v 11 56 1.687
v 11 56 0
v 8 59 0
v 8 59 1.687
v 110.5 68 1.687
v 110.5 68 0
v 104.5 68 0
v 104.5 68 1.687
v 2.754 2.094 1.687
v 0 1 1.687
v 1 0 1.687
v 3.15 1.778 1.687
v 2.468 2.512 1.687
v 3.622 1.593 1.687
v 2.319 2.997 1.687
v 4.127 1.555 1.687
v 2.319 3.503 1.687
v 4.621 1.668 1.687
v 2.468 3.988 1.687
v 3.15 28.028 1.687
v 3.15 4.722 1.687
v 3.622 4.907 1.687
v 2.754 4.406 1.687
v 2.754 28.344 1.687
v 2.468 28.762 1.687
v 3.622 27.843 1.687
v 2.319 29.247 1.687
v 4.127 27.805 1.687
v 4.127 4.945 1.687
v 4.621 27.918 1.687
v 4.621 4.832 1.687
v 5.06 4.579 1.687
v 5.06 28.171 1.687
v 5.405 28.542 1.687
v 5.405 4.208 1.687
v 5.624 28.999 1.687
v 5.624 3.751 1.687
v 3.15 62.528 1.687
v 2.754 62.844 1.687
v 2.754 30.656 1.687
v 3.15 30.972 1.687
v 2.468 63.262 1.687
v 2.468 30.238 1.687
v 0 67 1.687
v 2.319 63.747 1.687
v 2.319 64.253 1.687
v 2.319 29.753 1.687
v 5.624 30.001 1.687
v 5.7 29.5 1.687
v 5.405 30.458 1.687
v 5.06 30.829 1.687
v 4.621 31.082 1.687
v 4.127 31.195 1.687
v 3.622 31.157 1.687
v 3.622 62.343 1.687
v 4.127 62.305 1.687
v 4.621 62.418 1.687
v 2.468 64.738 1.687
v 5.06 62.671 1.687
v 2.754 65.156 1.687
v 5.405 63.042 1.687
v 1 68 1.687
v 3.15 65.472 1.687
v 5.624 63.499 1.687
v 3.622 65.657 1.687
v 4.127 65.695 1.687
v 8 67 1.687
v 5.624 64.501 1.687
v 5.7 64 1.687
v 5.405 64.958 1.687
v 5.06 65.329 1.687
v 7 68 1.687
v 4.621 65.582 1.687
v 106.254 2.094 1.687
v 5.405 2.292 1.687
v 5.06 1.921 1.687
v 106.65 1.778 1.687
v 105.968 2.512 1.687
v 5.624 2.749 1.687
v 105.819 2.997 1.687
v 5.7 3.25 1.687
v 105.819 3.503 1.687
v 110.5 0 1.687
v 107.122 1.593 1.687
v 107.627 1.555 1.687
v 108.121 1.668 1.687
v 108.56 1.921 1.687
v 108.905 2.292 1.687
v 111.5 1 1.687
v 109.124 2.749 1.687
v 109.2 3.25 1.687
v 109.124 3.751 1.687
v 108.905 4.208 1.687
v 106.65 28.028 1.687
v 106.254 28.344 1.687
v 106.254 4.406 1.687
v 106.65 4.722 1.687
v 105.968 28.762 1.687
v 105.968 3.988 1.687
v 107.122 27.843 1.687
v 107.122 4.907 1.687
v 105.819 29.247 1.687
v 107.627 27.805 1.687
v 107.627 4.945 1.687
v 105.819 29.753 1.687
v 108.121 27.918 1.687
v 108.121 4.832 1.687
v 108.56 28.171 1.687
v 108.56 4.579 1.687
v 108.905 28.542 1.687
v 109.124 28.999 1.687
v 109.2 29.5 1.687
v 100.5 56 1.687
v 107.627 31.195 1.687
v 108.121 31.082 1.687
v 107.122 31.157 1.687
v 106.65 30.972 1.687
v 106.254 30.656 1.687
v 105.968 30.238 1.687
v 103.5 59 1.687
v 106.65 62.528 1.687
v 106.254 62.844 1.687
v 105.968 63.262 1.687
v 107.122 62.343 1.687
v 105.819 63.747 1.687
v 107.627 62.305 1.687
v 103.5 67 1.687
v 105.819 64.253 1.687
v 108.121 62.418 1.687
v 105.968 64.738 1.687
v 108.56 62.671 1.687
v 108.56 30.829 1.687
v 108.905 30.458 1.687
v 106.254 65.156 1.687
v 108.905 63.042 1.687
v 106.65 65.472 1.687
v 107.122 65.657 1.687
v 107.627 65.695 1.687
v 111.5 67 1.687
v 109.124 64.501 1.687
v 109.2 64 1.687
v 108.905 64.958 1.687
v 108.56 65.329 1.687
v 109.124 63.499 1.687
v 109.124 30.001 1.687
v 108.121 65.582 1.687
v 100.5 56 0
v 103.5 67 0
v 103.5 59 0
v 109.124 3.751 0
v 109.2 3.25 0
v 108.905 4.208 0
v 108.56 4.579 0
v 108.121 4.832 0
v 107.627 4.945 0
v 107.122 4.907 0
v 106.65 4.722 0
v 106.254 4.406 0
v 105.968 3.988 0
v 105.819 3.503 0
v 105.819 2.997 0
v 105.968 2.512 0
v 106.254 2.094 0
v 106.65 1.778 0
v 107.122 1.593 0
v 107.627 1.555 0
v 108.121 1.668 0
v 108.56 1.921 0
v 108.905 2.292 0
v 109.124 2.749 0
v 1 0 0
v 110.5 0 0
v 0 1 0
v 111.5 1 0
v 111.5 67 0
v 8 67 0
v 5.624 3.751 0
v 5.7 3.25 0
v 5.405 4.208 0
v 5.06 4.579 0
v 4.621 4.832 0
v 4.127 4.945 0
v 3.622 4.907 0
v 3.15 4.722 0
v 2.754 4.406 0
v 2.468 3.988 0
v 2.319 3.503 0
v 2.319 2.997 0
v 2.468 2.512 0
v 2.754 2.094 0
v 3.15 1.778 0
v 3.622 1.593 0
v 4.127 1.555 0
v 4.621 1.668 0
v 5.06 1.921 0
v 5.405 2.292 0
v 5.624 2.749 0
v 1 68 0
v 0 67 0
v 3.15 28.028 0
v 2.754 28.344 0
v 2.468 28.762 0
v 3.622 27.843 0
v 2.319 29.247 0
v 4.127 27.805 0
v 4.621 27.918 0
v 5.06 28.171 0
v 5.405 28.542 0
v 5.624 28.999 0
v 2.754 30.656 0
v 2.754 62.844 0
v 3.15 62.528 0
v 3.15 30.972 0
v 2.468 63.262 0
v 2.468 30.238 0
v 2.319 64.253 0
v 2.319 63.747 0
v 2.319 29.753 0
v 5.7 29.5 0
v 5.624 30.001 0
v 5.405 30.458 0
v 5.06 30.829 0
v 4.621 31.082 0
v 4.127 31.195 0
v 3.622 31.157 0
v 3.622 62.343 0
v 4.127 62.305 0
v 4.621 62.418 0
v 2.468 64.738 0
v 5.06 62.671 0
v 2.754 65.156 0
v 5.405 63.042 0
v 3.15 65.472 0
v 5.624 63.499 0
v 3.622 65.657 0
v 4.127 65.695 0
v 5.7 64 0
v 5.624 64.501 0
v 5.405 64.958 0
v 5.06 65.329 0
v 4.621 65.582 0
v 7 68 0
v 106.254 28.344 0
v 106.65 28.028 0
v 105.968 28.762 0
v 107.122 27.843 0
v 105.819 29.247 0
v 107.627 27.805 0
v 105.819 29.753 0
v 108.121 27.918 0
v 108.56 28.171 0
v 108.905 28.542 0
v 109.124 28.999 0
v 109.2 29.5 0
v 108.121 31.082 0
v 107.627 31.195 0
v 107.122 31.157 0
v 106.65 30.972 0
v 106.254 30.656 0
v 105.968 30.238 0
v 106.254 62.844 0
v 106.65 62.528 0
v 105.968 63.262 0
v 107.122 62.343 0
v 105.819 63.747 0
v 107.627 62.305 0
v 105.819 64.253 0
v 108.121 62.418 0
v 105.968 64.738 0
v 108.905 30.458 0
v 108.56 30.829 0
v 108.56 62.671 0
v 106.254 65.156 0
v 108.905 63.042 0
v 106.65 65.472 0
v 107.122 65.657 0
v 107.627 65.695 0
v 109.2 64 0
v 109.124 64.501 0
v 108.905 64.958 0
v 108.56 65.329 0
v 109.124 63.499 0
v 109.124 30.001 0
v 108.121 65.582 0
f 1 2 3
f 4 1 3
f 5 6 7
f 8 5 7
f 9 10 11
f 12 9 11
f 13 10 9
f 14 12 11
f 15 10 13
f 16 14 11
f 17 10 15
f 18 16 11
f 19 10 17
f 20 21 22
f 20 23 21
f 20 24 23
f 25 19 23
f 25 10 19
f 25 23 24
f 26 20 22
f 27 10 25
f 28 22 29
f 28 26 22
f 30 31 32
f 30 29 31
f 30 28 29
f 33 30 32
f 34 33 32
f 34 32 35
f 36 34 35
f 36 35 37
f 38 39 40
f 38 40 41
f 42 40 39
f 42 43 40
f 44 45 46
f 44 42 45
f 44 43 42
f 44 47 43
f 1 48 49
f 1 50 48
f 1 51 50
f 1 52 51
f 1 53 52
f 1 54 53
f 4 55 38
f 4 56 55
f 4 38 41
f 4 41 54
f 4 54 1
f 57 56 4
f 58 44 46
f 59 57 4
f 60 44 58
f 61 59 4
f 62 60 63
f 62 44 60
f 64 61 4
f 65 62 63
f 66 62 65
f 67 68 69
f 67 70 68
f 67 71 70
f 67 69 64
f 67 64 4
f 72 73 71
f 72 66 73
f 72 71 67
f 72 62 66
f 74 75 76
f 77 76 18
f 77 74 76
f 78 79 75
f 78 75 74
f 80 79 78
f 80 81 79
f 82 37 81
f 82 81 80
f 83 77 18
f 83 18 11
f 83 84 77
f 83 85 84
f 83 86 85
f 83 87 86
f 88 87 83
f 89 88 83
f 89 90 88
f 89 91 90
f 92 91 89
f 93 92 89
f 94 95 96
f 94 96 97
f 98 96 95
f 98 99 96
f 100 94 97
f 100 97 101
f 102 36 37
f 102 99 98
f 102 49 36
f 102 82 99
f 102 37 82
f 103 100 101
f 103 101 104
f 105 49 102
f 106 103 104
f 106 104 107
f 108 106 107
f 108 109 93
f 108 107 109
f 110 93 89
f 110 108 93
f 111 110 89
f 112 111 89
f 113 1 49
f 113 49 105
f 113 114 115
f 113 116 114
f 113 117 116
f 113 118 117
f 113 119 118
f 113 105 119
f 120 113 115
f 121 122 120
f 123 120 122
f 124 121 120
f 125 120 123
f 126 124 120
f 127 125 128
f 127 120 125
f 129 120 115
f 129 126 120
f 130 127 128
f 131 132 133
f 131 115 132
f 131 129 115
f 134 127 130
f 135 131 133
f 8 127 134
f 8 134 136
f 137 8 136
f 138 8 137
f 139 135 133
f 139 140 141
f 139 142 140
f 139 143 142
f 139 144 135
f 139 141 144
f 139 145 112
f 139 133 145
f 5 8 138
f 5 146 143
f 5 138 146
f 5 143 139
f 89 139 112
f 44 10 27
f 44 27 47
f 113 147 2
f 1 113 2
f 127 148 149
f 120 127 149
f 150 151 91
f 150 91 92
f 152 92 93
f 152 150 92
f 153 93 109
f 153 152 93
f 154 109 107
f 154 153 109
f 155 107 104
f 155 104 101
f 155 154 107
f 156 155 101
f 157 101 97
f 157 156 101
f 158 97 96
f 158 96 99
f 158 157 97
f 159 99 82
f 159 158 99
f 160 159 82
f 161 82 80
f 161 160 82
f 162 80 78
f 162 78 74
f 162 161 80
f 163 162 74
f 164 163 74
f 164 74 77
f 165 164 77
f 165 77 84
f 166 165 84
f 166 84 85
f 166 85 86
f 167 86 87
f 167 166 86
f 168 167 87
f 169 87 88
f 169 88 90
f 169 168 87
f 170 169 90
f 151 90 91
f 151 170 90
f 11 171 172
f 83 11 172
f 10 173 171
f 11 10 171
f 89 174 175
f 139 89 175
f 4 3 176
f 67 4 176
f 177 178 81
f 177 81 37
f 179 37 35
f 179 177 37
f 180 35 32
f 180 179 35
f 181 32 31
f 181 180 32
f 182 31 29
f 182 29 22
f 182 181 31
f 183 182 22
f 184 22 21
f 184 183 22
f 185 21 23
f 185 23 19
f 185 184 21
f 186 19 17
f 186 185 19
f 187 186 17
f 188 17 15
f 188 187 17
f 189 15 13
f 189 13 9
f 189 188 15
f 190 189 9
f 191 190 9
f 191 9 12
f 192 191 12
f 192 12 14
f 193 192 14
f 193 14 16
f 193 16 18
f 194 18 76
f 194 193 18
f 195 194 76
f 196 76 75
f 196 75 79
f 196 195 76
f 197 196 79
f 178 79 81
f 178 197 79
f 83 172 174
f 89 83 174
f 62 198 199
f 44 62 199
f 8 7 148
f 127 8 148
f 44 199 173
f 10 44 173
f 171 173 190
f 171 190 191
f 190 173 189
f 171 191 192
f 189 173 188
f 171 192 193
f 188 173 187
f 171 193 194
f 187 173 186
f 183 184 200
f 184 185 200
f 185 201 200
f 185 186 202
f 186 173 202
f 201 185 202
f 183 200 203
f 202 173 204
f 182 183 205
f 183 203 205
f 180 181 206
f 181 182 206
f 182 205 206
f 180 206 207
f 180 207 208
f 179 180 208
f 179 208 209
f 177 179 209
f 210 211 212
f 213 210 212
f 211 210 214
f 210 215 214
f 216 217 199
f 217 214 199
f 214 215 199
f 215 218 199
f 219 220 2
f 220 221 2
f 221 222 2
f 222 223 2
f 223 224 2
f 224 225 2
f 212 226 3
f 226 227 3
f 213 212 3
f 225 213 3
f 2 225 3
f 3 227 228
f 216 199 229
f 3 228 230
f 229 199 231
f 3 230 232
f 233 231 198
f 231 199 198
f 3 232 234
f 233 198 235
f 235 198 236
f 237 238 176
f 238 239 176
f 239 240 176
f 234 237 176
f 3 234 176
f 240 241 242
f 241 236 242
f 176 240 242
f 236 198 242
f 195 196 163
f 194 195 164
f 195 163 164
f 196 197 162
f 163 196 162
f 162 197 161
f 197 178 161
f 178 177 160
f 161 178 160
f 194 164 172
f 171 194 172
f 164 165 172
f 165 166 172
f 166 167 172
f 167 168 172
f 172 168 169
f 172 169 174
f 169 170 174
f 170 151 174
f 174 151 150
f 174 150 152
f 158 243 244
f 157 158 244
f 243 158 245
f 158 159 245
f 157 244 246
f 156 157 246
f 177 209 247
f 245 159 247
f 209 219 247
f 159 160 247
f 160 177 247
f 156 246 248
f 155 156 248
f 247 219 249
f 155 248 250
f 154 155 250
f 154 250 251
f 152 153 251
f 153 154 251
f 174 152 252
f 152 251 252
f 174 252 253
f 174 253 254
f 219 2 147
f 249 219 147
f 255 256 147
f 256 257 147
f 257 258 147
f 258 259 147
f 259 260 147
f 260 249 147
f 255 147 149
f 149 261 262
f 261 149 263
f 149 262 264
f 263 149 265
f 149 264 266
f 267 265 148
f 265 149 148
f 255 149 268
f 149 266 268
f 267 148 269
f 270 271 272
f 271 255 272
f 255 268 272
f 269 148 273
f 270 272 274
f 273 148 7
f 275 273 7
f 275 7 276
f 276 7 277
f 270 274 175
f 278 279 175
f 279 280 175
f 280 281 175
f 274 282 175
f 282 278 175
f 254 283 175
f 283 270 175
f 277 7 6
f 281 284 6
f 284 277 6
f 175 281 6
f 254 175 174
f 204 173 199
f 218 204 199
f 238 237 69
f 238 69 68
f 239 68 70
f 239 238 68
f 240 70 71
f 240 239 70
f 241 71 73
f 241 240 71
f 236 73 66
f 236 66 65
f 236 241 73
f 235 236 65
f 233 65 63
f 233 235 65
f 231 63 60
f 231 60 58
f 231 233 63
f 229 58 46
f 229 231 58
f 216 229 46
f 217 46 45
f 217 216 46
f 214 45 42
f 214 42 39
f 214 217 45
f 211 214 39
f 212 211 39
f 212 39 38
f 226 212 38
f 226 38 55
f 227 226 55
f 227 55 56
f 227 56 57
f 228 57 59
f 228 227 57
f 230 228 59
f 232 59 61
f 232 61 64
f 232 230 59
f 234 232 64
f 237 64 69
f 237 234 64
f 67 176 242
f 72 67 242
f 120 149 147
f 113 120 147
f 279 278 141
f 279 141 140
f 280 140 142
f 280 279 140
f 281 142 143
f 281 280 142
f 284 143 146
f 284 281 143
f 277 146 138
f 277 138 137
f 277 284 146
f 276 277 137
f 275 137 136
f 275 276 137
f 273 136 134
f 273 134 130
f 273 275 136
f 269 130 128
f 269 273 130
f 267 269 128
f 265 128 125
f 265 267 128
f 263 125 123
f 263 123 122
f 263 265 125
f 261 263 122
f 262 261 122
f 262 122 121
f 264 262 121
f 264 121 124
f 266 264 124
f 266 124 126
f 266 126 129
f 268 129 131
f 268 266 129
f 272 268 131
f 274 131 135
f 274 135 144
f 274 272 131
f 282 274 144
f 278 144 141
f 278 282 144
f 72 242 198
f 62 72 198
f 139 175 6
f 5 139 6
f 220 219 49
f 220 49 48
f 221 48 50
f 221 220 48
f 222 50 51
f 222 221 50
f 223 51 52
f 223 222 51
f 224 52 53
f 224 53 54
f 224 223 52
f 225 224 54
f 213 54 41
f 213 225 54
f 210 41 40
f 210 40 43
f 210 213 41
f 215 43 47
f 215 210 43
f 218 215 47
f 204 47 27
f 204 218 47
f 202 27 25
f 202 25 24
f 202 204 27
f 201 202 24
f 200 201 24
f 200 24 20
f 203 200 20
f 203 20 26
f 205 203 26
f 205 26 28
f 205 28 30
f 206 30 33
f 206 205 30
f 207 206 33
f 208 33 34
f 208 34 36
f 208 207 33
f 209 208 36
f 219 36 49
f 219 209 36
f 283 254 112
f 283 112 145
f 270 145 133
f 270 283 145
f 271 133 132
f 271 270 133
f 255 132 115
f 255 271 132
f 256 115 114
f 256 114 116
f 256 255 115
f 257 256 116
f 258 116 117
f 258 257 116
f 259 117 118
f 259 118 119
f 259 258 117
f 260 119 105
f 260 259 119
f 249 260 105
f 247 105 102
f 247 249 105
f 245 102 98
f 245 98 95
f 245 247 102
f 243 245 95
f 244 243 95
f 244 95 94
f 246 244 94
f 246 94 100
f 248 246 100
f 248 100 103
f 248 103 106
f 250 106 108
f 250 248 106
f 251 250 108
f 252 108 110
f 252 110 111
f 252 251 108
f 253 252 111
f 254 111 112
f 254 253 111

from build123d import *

# Parameters (mm, degrees)
SKETCH1_R           = 1.7
BOSS_EXTRUDE1_DEPTH = 1.68656


with BuildPart() as part:
    # Sketch1 → Boss-Extrude1 (new body)
    with BuildSketch(Plane.XY):
        Polygon((0, 1), (1, 0), (110.5, 0), (111.5, 1), (111.5, 67), (110.5, 68), (104.5, 68), (103.5, 67), (103.5, 59), (100.5, 56), (11, 56), (8, 59), (8, 67), (7, 68), (1, 68), (0, 67), align=None)
        with Locations((107.5, 29.5)):
            Circle(SKETCH1_R, mode=Mode.SUBTRACT)
        with Locations((107.5, 64)):
            Circle(SKETCH1_R, mode=Mode.SUBTRACT)
        with Locations((107.5, 3.25)):
            Circle(SKETCH1_R, mode=Mode.SUBTRACT)
        with Locations((4, 64)):
            Circle(SKETCH1_R, mode=Mode.SUBTRACT)
        with Locations((4, 29.5)):
            Circle(SKETCH1_R, mode=Mode.SUBTRACT)
        with Locations((4, 3.25)):
            Circle(SKETCH1_R, mode=Mode.SUBTRACT)
    extrude(amount=BOSS_EXTRUDE1_DEPTH)


solid = part.part
